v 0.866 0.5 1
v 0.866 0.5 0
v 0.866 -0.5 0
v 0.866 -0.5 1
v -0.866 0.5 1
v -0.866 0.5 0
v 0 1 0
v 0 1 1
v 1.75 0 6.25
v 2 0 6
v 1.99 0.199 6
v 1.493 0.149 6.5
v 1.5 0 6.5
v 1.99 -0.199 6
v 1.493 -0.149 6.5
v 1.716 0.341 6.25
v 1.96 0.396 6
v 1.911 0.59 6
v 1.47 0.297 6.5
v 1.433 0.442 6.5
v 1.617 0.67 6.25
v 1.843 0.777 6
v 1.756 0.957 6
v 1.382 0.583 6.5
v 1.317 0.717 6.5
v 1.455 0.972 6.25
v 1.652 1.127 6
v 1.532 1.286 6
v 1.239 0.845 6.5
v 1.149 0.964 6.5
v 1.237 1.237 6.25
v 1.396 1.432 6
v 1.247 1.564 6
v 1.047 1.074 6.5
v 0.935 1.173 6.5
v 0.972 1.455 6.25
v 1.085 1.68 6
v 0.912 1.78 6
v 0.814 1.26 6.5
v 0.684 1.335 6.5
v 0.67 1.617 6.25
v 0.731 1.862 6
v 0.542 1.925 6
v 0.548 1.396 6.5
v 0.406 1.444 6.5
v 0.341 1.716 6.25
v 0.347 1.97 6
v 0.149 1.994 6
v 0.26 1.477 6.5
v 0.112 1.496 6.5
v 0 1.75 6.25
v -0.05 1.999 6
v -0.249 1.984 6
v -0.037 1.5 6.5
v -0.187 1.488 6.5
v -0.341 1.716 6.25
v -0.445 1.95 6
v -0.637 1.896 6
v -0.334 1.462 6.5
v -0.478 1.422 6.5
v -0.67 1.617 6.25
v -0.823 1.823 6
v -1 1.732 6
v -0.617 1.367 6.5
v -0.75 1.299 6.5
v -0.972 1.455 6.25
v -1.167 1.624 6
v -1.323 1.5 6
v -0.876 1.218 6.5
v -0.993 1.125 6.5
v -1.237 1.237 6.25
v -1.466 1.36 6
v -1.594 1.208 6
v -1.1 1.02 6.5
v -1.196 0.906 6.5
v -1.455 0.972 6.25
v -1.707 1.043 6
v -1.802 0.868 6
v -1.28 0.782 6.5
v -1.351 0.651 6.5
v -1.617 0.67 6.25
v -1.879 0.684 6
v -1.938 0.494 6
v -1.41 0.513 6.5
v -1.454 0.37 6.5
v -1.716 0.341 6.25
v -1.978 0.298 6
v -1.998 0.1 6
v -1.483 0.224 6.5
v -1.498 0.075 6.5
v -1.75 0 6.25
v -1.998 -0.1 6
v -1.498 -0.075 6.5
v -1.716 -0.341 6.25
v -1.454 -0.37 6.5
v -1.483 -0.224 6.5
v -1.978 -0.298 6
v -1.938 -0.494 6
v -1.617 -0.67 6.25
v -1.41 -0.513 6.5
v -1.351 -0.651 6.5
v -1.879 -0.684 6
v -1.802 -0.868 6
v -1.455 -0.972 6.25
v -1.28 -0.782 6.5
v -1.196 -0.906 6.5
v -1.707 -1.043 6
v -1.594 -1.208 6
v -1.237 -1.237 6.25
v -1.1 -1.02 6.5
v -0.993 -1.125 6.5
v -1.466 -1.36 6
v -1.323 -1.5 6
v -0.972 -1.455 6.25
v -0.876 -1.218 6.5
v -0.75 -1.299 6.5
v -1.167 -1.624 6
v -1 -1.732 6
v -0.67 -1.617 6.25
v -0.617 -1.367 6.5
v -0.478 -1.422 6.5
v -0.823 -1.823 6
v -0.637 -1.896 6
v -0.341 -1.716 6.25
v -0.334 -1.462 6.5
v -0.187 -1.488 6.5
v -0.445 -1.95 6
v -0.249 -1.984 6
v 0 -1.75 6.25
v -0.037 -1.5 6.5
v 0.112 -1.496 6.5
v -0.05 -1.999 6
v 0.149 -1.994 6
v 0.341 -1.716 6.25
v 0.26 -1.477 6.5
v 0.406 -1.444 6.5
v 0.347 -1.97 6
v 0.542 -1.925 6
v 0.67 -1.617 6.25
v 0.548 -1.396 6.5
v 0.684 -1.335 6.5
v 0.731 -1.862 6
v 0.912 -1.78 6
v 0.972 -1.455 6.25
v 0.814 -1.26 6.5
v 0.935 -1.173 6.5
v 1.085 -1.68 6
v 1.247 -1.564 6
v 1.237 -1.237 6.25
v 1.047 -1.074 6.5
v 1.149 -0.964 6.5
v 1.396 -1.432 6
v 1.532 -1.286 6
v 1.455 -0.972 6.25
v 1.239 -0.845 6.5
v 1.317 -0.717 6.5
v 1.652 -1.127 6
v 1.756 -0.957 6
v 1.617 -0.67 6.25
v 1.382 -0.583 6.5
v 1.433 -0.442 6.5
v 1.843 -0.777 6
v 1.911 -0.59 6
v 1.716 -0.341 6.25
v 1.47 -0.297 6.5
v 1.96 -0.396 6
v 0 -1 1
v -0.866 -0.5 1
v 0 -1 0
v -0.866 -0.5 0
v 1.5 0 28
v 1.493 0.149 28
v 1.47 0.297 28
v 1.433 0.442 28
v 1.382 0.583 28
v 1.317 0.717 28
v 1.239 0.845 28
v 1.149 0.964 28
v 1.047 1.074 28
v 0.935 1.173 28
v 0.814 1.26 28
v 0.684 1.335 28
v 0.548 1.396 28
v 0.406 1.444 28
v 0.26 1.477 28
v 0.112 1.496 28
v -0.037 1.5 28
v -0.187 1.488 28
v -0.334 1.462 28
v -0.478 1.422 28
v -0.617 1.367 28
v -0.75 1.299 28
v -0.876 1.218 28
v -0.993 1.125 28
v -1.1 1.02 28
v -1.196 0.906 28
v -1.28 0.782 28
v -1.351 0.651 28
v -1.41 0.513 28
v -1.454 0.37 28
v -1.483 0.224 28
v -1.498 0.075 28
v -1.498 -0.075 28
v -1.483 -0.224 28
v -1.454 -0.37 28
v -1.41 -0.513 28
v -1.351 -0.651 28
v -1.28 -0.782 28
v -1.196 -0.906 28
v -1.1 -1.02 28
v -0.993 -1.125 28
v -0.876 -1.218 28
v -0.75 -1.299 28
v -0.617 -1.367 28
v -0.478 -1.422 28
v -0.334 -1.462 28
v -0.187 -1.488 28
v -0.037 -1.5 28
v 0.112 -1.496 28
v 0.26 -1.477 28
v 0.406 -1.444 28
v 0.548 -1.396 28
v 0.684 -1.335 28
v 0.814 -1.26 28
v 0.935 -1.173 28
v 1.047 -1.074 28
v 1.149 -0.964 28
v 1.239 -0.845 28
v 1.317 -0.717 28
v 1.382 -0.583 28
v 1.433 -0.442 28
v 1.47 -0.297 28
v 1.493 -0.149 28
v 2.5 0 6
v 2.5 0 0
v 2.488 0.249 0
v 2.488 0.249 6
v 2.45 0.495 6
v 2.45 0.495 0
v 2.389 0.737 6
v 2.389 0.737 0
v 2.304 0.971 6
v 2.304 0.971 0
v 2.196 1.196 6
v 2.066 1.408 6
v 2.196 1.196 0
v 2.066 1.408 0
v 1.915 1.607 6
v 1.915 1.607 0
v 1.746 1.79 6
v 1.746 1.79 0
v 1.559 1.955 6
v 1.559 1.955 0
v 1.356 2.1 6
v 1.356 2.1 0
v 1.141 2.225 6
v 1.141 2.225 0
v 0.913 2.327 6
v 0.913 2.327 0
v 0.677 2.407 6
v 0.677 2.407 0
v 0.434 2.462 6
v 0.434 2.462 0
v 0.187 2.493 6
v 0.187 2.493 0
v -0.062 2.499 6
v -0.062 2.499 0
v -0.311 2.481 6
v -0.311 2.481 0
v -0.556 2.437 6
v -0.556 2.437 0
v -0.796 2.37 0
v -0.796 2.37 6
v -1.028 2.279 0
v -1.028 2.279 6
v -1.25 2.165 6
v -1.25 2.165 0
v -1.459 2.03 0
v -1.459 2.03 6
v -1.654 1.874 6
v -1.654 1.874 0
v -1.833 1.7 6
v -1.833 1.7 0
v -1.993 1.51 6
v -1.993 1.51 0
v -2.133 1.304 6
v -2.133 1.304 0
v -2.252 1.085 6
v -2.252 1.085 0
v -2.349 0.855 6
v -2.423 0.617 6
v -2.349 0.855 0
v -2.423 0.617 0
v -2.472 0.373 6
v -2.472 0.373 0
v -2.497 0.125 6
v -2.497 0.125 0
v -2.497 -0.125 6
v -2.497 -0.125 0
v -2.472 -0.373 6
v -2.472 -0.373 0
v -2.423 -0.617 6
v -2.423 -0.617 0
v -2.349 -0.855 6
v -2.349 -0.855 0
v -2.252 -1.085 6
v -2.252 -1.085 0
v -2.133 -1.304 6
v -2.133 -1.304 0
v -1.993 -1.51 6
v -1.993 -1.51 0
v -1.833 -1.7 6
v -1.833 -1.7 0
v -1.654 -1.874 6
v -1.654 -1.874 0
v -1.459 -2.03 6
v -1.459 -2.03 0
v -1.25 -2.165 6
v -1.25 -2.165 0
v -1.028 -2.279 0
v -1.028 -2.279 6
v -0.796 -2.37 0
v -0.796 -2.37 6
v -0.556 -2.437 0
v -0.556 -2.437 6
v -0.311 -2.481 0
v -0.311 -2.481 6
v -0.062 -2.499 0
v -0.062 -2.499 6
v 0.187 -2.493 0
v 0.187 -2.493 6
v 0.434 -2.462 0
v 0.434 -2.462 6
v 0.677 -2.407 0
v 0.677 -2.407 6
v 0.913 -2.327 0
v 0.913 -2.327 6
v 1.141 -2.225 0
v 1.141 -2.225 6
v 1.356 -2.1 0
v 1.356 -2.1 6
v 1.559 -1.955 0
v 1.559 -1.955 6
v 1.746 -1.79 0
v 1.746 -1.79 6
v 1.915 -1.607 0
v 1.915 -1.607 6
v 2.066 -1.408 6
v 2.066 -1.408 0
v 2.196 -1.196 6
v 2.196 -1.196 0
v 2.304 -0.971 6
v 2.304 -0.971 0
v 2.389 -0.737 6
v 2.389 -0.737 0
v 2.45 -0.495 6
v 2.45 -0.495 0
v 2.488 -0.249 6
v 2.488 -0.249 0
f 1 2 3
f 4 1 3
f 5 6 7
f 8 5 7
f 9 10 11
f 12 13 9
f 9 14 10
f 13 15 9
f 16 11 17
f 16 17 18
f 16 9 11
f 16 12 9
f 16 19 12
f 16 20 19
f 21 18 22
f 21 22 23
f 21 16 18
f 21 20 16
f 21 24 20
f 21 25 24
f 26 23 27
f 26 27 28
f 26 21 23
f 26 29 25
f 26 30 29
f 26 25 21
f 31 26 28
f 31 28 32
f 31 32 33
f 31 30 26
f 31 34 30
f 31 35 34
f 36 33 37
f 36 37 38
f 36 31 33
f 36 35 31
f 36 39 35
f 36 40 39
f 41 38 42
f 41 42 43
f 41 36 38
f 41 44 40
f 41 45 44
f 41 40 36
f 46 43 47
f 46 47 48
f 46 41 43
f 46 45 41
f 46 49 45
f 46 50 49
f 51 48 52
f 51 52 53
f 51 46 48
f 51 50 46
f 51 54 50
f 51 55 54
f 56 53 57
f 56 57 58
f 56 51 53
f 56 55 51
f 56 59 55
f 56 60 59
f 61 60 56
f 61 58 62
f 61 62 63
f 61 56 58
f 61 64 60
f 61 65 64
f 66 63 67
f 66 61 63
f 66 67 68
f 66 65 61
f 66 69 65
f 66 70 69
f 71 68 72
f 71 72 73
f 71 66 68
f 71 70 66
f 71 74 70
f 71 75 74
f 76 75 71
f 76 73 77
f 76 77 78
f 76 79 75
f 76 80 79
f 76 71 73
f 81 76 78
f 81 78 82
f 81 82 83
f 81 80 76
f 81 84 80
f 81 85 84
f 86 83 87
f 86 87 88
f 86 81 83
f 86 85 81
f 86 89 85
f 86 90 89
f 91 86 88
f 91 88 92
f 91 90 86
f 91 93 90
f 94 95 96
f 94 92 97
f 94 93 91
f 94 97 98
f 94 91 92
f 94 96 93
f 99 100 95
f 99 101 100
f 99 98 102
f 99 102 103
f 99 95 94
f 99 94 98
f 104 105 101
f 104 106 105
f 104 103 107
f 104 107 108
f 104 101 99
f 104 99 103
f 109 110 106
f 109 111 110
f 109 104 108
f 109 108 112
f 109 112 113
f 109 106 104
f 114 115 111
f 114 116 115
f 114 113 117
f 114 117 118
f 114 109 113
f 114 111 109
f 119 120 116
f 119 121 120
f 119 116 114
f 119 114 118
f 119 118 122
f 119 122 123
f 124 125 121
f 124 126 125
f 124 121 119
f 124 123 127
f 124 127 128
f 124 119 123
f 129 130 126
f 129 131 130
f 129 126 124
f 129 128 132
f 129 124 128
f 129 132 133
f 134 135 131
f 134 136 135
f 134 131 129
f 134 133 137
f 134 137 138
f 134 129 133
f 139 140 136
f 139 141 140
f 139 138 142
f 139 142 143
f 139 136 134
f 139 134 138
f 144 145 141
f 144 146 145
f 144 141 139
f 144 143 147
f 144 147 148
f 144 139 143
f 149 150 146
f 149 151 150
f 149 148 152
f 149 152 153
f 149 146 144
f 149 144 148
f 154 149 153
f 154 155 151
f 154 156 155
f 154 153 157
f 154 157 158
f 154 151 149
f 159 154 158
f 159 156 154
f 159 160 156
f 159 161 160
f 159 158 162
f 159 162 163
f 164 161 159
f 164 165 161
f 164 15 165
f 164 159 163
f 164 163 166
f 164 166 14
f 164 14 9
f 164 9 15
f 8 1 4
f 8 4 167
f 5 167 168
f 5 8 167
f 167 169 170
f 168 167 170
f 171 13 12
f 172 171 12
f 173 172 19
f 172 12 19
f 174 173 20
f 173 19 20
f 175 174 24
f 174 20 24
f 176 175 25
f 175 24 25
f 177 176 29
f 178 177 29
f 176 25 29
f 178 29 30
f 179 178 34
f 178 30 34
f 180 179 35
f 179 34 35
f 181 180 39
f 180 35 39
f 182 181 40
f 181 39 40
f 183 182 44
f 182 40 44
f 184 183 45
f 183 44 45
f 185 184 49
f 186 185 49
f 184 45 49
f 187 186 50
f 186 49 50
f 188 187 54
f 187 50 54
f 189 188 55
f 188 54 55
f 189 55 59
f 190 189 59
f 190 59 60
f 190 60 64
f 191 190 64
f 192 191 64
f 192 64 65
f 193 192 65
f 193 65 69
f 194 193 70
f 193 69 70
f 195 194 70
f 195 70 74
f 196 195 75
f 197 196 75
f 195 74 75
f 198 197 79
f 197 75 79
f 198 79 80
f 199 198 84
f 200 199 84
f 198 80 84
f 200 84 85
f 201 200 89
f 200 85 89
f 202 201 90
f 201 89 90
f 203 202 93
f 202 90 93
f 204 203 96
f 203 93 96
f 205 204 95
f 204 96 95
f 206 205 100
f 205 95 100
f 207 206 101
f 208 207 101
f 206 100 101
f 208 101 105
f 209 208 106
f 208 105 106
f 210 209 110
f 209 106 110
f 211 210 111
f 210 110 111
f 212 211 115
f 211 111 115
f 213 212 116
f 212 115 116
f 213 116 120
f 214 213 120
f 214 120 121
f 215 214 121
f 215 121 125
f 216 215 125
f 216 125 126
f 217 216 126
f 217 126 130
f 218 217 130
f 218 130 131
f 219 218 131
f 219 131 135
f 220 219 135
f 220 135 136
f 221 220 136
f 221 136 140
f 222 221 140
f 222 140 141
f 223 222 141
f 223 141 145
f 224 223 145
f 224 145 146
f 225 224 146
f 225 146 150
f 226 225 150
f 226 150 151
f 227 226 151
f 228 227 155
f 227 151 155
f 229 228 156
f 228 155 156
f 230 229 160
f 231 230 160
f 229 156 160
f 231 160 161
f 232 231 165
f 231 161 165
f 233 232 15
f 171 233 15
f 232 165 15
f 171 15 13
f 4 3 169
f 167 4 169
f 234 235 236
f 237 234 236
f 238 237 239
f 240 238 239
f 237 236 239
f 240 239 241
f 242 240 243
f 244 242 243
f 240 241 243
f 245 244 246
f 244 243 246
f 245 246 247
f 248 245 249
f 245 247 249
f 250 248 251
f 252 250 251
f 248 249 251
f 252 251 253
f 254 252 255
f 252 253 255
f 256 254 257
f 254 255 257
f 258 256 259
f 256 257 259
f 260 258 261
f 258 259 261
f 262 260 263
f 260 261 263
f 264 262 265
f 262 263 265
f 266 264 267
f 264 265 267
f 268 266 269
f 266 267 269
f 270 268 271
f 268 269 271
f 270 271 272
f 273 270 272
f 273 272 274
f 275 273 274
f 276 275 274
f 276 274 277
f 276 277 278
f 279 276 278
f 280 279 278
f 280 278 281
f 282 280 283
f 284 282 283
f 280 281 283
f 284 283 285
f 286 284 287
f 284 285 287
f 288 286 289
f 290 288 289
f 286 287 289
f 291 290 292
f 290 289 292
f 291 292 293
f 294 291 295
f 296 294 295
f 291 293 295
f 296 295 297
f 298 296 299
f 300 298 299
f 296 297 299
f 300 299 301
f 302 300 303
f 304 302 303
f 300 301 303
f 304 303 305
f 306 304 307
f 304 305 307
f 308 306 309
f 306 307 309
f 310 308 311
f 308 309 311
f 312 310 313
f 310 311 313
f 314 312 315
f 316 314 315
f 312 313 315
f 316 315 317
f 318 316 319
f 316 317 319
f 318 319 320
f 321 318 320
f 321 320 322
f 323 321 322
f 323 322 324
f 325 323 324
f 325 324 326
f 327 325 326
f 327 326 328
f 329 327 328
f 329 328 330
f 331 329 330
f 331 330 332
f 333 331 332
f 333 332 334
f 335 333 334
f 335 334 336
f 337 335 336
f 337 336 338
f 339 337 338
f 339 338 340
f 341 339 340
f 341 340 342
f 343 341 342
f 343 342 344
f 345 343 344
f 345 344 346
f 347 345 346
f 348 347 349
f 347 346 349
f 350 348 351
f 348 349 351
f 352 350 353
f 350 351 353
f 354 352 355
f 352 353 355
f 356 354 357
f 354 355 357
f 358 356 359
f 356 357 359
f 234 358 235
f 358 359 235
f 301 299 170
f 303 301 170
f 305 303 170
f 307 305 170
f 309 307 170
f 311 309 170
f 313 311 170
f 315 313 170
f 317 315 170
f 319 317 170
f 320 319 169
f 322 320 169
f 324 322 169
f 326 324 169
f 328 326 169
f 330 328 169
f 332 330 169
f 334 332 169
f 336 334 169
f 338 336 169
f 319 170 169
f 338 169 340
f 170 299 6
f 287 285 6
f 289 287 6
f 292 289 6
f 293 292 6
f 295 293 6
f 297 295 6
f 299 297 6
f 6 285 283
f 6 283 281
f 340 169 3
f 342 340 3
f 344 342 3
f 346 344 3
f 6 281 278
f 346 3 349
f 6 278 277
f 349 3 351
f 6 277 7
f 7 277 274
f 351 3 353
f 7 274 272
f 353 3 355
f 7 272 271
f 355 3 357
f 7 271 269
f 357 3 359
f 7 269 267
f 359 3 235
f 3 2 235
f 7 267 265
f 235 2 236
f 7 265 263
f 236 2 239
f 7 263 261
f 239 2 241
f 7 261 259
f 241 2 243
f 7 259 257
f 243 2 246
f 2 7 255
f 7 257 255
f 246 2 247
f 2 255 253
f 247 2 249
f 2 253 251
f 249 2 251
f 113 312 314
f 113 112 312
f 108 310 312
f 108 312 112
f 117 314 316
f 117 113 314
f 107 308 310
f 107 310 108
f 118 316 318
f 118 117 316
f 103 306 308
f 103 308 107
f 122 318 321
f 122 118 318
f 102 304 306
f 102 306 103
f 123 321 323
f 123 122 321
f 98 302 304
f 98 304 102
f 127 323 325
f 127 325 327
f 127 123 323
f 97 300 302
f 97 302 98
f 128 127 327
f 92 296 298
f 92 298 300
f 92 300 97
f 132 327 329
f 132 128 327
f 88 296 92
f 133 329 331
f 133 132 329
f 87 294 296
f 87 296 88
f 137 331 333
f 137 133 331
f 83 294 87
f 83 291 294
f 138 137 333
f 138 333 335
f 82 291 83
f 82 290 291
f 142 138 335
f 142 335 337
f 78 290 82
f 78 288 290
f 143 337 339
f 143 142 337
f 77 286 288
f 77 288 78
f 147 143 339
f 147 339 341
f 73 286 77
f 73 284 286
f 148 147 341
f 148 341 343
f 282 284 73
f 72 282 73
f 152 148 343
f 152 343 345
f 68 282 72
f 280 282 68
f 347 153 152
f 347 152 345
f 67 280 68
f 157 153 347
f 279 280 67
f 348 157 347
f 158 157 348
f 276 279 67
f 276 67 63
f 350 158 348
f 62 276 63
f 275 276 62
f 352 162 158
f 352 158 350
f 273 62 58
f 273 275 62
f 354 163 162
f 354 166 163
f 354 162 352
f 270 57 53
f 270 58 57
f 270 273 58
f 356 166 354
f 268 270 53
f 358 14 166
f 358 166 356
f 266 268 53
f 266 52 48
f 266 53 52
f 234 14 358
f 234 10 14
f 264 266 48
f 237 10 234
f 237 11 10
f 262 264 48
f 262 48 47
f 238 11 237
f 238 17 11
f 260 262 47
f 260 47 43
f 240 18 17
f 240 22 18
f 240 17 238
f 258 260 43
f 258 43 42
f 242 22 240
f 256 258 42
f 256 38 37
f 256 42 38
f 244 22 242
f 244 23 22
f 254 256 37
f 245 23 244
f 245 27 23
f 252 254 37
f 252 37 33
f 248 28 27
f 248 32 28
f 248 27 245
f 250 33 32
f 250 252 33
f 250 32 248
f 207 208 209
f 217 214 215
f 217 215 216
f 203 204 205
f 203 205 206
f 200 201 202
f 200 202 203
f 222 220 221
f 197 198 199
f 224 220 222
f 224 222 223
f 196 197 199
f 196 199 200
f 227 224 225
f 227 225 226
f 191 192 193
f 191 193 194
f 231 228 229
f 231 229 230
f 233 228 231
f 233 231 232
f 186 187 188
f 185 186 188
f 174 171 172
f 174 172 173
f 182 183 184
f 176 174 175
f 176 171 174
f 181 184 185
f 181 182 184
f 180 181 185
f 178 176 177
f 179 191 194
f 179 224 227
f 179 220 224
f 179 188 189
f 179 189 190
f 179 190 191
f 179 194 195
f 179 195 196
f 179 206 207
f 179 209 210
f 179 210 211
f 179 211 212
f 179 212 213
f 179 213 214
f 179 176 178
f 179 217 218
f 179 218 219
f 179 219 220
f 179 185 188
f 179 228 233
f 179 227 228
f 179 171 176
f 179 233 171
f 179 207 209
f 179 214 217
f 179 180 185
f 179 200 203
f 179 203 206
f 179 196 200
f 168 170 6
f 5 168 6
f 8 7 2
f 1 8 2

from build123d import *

# Parameters (mm, degrees)
SKETCH1_R           = 2.5
BOSS_EXTRUDE1_DEPTH = 6
SKETCH2_R           = 1.5
BOSS_EXTRUDE2_DEPTH = 22
CUT_EXTRUDE1_DEPTH  = 1
CHAMFER1_SIZE       = 0.5


with BuildPart() as part:
    # Sketch1 → Boss-Extrude1 (new body)
    with BuildSketch(Plane.XY):
        Circle(SKETCH1_R)
    extrude(amount=BOSS_EXTRUDE1_DEPTH)

    # Sketch2 → Boss-Extrude2 (add)
    with BuildSketch(Plane.XY.offset(6)):
        Circle(SKETCH2_R)
    extrude(amount=BOSS_EXTRUDE2_DEPTH)

    # Sketch3 → Cut-Extrude1 (cut)
    with BuildSketch(Plane(origin=(0, 0, 0), x_dir=(-1, 0, 0), z_dir=(0, 0, -1))):
        Polygon((0, 1), (-0.866025404, 0.5), (-0.866025404, -0.5), (0, -1), (0.866025404, -0.5), (0.866025404, 0.5), align=None)
    extrude(amount=-CUT_EXTRUDE1_DEPTH, mode=Mode.SUBTRACT)

    # Chamfer1
    chamfer1_edges = [part.edges().sort_by_distance(p)[0] for p in [
        (-1.5, 0, 6),
    ]]
    chamfer(chamfer1_edges, length=CHAMFER1_SIZE)


solid = part.part
